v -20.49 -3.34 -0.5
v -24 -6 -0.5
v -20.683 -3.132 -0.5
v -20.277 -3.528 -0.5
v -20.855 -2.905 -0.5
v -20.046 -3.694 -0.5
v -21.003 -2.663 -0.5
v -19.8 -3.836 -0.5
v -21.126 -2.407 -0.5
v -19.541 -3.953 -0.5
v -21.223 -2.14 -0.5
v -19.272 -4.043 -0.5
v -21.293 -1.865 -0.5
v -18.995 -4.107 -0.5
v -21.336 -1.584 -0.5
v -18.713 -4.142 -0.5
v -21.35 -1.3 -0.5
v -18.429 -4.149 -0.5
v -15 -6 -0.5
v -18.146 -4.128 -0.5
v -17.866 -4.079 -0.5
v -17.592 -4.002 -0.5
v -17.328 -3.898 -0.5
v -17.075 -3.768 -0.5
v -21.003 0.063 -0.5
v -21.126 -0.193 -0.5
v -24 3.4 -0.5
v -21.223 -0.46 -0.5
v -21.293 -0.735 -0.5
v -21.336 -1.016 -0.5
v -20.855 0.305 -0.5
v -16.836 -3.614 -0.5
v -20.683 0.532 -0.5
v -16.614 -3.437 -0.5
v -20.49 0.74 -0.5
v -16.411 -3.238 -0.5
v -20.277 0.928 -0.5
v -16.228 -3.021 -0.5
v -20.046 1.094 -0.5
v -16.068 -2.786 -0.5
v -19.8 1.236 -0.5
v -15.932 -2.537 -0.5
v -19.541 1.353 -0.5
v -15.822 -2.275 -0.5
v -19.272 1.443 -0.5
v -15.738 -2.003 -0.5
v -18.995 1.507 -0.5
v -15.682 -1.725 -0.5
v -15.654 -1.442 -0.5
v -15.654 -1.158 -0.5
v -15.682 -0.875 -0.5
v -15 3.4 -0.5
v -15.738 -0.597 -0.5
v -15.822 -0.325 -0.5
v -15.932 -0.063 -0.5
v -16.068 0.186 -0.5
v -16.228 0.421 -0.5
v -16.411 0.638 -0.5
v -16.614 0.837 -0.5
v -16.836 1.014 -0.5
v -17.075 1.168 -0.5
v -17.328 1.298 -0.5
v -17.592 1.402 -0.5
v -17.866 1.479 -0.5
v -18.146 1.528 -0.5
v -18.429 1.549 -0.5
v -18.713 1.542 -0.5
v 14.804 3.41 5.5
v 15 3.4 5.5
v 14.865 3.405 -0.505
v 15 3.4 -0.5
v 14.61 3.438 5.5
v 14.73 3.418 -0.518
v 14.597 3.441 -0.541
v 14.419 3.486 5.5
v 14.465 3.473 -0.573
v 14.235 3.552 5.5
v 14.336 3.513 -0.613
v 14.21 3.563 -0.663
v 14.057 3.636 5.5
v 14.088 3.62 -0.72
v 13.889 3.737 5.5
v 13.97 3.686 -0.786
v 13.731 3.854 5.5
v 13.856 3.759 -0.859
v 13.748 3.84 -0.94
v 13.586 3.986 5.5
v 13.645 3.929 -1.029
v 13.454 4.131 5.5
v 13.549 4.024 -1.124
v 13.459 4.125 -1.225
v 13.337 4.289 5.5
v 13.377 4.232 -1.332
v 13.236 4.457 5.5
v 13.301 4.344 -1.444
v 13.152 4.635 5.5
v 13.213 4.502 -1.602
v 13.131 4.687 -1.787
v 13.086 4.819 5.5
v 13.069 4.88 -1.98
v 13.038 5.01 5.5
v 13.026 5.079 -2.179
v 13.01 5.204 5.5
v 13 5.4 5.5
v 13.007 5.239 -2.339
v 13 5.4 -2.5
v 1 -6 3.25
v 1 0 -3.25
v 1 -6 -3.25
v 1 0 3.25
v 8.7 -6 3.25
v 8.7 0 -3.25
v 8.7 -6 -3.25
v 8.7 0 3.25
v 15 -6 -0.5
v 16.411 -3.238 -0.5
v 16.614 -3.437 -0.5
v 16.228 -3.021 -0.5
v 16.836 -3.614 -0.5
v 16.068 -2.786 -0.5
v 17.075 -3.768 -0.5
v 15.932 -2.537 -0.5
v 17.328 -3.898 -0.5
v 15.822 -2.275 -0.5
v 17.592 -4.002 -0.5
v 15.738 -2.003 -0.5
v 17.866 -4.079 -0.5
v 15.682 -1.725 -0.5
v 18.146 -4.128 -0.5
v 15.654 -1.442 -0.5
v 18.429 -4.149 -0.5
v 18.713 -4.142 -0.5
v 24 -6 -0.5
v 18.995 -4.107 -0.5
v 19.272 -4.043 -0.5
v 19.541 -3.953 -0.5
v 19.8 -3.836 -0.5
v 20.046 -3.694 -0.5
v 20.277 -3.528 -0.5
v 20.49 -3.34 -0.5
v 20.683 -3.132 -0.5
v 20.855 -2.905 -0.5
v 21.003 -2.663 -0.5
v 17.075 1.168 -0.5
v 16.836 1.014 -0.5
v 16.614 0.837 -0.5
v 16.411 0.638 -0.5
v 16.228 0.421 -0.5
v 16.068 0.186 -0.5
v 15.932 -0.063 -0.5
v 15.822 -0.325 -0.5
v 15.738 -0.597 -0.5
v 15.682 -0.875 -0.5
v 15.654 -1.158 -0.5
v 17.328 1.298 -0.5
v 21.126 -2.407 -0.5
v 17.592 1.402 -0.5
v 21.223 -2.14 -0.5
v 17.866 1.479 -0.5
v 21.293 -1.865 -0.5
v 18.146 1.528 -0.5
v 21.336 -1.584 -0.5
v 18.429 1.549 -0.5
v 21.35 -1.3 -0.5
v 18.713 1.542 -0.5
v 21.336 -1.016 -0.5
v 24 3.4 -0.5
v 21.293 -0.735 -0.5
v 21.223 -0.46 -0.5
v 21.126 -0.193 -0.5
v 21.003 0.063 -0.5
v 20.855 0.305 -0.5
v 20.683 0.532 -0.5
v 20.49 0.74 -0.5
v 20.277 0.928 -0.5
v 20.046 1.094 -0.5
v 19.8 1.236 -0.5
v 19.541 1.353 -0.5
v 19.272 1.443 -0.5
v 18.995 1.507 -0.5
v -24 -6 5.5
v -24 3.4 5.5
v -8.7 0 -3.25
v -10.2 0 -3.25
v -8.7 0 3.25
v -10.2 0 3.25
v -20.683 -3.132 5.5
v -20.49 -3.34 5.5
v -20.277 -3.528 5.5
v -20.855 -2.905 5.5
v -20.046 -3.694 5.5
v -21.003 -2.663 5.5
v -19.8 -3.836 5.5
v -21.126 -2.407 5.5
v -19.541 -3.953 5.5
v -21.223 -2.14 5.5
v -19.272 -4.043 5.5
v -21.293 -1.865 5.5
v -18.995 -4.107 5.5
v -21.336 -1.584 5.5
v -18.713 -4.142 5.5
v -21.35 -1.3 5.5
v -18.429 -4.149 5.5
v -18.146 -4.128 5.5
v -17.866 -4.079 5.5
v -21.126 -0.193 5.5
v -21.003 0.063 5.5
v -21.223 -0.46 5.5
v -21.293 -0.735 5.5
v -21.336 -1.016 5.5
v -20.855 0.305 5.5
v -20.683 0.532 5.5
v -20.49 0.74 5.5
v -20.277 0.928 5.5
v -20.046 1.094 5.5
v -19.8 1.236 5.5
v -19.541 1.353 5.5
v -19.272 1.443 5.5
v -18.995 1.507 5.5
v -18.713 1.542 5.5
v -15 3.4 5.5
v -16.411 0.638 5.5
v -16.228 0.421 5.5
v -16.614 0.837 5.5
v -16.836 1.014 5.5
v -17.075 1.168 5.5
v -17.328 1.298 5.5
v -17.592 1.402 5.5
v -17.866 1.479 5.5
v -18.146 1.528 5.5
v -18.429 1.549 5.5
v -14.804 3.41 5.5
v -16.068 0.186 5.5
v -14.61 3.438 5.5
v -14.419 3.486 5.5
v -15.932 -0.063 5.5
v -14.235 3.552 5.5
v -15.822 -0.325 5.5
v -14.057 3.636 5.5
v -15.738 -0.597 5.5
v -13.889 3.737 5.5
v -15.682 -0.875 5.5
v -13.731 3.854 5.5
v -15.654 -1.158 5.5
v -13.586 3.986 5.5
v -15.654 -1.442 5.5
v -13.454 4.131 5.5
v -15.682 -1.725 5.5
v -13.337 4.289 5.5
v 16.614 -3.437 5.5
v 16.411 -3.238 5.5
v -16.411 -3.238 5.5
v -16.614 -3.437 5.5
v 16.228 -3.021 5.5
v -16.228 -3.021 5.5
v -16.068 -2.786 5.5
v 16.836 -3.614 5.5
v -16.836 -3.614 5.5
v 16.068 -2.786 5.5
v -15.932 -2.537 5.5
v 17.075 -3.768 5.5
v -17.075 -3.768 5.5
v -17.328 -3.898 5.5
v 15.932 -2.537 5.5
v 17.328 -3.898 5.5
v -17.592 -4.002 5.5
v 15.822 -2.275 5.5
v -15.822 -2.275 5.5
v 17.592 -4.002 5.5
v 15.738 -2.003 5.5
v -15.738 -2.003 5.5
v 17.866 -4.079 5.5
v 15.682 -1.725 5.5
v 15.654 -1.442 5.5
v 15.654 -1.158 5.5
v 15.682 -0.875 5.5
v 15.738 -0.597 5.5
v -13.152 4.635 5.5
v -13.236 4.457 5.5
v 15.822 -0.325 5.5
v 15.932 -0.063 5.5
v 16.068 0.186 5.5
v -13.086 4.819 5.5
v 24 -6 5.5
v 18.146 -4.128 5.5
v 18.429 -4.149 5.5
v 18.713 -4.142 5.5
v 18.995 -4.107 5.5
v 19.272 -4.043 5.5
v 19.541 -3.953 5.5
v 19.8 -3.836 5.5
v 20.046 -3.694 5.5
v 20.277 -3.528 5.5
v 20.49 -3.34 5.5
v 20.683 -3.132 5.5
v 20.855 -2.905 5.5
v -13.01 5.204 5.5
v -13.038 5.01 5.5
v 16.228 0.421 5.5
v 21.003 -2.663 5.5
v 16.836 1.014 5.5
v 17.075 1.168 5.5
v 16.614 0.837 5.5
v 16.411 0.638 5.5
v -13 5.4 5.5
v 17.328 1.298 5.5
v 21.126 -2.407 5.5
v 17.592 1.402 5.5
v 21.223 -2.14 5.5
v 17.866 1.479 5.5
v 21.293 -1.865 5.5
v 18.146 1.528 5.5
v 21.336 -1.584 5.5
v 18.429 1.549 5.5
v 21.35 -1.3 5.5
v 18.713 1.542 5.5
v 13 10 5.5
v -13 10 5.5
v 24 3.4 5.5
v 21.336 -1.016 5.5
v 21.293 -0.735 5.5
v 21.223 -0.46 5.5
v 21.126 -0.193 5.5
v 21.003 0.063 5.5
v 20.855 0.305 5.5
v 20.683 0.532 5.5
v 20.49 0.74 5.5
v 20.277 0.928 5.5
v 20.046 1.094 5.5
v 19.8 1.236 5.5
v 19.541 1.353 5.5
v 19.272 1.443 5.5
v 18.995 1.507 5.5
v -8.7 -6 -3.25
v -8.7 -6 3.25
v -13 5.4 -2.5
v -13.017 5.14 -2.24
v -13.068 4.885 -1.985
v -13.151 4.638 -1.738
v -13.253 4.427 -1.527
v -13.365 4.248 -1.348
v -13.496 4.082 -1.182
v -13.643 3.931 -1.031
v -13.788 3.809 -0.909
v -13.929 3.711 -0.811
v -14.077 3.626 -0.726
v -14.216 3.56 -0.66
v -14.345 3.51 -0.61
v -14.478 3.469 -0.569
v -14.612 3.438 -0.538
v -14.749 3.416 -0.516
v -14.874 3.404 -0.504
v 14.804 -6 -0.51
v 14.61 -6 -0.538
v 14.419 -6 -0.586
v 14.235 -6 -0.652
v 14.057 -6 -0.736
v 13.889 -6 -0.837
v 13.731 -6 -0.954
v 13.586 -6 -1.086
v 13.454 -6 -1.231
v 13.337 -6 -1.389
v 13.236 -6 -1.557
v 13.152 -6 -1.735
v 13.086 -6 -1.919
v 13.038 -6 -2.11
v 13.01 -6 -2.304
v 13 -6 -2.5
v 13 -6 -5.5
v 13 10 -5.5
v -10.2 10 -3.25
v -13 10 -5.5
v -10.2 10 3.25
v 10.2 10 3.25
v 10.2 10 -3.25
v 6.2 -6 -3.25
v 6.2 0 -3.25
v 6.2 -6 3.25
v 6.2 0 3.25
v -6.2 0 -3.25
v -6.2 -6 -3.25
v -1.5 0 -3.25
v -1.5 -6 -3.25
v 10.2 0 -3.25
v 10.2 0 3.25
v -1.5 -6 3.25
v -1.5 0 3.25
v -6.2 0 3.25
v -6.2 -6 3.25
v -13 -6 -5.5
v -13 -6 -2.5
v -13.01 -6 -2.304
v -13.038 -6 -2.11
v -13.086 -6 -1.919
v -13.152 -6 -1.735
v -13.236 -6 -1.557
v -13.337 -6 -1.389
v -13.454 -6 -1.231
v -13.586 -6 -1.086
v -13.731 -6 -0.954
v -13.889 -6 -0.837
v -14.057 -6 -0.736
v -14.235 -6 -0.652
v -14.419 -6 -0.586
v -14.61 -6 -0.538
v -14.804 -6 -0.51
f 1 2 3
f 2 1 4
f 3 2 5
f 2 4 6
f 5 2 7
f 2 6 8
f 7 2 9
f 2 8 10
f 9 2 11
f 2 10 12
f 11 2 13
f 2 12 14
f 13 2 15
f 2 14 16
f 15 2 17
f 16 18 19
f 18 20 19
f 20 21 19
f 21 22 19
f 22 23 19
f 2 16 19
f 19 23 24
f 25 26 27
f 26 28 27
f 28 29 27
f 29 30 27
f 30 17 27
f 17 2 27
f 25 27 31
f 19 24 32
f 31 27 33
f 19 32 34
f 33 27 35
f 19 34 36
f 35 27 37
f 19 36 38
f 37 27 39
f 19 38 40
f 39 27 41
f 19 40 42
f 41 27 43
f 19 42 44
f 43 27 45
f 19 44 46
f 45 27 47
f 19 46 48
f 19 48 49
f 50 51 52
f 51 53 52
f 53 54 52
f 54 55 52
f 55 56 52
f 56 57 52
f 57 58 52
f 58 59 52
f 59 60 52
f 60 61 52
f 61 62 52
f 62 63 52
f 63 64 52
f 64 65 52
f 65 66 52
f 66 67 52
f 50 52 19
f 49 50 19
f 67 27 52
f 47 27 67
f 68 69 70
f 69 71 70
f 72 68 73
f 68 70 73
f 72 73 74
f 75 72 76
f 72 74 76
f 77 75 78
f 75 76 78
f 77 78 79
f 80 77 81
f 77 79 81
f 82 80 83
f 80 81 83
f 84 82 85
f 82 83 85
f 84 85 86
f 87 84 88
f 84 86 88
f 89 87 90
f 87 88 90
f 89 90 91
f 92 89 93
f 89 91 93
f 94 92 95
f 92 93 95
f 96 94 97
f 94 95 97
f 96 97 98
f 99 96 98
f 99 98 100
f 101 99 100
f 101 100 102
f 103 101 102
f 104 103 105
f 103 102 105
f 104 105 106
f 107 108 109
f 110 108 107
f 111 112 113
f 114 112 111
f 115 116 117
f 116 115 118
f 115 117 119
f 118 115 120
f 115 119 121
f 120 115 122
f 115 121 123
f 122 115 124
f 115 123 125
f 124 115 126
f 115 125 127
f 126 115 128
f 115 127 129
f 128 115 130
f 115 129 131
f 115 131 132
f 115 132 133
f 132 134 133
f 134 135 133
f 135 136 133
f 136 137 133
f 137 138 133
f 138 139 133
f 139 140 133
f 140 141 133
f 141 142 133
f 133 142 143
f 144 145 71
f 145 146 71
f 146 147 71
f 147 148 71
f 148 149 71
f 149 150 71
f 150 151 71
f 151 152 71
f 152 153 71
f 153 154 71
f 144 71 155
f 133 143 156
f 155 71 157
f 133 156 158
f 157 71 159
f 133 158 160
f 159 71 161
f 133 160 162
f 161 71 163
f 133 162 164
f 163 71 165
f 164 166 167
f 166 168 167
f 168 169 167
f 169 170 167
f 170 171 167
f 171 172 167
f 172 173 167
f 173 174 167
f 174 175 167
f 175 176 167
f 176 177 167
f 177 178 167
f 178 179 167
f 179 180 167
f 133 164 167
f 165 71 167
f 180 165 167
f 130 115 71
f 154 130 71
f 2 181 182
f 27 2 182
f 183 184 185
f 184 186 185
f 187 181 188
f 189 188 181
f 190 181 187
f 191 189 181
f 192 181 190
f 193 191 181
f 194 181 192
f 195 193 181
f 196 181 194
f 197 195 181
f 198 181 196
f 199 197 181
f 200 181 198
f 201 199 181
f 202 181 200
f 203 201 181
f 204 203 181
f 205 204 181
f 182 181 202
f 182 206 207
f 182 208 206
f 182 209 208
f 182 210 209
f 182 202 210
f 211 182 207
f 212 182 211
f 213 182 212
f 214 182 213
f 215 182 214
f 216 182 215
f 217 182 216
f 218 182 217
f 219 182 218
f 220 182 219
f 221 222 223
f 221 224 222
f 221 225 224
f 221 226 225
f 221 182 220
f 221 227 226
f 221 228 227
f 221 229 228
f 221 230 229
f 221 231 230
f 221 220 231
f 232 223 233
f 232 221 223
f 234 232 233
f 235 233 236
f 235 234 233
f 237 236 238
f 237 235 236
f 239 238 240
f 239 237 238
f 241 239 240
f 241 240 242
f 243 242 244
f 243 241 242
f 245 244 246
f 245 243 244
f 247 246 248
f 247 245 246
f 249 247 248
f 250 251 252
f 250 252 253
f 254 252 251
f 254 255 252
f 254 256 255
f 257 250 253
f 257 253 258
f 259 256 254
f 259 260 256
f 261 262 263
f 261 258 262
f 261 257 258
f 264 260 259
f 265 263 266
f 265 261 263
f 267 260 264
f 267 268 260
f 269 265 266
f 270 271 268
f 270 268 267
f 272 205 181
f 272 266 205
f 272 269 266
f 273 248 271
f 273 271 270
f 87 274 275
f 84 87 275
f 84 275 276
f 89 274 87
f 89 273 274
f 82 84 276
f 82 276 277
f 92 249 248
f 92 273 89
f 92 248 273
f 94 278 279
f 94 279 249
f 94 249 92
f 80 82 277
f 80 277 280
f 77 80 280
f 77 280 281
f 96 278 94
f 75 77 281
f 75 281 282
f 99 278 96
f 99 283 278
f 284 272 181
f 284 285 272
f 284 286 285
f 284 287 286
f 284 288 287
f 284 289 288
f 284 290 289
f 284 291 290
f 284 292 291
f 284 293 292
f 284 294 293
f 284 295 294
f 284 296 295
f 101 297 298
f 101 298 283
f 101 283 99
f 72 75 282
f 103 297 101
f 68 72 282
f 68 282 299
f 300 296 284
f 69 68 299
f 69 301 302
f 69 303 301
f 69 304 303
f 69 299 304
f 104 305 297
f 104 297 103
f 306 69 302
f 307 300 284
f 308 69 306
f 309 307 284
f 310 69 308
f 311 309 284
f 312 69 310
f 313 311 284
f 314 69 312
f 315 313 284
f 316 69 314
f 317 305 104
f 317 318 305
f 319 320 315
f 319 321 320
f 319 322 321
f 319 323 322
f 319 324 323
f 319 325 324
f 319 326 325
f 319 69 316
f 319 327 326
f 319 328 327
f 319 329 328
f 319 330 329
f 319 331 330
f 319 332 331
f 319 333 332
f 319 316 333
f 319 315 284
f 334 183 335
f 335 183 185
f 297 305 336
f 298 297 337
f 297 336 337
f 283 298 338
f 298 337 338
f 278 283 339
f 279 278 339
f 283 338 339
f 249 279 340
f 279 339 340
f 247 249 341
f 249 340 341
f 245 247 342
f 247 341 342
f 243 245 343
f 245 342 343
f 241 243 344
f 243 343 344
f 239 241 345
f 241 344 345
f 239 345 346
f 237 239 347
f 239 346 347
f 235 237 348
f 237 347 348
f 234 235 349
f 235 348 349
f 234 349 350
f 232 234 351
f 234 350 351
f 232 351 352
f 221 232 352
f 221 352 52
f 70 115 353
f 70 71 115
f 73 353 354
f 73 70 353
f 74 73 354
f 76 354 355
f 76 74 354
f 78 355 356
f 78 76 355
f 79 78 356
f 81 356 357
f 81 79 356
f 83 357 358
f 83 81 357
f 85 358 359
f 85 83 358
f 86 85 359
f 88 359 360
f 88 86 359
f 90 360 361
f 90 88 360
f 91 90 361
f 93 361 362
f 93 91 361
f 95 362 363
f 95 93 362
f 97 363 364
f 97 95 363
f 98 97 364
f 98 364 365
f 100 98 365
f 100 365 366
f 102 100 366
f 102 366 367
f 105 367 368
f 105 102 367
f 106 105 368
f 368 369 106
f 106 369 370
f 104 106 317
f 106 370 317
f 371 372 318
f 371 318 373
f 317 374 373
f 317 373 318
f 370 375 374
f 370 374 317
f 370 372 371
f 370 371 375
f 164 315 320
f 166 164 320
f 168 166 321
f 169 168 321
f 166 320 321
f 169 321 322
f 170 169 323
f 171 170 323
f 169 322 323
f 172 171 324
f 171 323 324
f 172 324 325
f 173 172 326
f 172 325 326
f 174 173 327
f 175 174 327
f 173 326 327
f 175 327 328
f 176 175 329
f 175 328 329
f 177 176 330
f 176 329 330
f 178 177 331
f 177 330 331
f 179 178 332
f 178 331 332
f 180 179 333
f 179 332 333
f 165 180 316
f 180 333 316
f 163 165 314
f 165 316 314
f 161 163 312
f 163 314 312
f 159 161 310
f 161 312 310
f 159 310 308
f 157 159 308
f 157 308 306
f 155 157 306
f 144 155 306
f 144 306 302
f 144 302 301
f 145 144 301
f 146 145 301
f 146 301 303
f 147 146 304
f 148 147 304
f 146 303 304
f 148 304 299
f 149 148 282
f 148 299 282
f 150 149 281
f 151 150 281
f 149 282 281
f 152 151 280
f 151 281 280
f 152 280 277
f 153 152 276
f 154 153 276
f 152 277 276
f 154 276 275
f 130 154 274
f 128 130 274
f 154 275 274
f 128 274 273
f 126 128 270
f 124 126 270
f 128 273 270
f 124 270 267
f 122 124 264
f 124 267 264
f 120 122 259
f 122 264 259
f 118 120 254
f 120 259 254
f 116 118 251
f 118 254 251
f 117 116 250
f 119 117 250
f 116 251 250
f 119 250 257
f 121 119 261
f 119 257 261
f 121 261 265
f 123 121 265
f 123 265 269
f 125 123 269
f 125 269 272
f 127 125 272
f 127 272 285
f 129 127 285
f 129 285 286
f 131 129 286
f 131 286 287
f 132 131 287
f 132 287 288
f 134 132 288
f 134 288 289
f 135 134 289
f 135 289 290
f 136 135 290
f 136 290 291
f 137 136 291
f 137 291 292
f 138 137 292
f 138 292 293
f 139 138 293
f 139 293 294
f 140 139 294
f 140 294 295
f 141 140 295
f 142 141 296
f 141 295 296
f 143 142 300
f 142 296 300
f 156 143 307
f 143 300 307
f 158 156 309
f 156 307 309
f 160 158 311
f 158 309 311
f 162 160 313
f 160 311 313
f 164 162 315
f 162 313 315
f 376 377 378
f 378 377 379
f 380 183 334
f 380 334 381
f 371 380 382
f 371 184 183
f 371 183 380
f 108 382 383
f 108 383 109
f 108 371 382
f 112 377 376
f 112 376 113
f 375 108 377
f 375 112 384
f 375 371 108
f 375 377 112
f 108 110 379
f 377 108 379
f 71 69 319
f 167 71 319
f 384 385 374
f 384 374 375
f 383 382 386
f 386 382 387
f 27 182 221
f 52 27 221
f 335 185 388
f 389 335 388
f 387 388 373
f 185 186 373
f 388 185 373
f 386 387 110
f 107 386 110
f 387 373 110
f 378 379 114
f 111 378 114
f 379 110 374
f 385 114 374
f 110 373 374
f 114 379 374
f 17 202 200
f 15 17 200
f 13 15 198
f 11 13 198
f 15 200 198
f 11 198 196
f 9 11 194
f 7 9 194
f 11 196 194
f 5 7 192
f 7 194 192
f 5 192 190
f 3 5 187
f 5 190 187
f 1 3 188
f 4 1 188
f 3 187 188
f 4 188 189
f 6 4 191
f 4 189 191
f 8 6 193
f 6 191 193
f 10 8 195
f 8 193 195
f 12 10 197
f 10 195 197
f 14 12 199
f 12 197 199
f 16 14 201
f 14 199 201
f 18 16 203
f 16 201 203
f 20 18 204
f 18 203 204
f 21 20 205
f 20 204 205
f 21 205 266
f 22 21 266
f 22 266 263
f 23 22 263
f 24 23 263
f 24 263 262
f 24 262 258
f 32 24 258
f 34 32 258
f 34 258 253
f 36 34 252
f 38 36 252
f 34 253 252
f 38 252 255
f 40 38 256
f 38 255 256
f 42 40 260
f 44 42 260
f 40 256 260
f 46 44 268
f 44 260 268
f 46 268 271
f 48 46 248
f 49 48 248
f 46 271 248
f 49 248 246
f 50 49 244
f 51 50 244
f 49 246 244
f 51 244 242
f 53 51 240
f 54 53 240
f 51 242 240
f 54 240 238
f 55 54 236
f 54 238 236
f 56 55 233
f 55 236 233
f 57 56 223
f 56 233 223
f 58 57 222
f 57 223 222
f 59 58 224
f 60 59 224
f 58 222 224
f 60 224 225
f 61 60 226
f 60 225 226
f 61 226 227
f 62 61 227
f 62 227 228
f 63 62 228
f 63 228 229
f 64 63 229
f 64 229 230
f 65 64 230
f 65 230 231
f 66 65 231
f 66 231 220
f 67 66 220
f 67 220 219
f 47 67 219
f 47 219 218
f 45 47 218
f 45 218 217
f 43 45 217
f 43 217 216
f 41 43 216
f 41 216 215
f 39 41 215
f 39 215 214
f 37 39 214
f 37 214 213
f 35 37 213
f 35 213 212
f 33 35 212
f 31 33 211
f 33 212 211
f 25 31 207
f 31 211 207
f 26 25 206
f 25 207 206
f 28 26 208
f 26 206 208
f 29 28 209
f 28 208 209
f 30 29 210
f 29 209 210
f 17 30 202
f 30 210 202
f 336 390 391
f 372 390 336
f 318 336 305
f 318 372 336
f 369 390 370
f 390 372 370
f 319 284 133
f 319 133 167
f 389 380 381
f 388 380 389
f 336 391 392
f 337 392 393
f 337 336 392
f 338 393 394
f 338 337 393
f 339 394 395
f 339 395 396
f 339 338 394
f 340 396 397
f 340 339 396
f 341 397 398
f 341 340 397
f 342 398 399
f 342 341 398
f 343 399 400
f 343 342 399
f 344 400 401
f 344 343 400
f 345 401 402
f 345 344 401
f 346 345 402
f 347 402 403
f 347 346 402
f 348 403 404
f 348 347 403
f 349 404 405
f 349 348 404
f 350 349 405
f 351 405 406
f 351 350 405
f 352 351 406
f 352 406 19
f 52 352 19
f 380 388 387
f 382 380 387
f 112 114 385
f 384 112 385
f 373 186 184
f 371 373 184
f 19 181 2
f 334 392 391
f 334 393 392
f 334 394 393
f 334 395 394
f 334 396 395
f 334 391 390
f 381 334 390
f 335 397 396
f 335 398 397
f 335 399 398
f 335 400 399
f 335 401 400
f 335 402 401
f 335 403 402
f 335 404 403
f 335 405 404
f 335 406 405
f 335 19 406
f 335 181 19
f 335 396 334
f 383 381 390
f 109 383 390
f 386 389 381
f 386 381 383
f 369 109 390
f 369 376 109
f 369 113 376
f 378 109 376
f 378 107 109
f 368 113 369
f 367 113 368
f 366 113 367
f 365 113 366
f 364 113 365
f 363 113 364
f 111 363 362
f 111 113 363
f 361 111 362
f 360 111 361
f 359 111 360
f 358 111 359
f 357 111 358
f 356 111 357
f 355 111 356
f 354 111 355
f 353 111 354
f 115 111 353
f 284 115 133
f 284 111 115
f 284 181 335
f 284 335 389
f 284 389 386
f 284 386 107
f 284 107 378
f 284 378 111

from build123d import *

# Parameters (mm, degrees)
SKETCH2_W           = 26
SKETCH2_H           = 11
SKETCH2_W_2         = 20.4
SKETCH2_H_2         = 6.5
BOSS_EXTRUDE1_DEPTH = 10
SKETCH3_W           = 26
SKETCH3_H           = 11
SKETCH3_W_2         = 2.5
SKETCH3_H_2         = 6.5
BOSS_EXTRUDE2_DEPTH = 6
SKETCH4_W           = 11
SKETCH4_H           = 9.4
SKETCH4_R           = 2.85
BOSS_EXTRUDE3_DEPTH = 6
FILLET1_R           = 2


with BuildPart() as part:
    # Sketch2 → Boss-Extrude1 (new body)
    with BuildSketch(Plane(origin=(0, 0, 0), x_dir=(1, 0, 0), z_dir=(0, 1, 0))):
        Rectangle(SKETCH2_W, SKETCH2_H)
        Rectangle(SKETCH2_W_2, SKETCH2_H_2, mode=Mode.SUBTRACT)
    extrude(amount=BOSS_EXTRUDE1_DEPTH)

    # Sketch3 → Boss-Extrude2 (add)
    with BuildSketch(Plane.XZ):
        Rectangle(SKETCH3_W, SKETCH3_H)
        with Locations((-7.45, 0)):
            Rectangle(SKETCH3_W_2, SKETCH3_H_2, mode=Mode.SUBTRACT)
        with Locations((-0.25, 0)):
            Rectangle(SKETCH3_W_2, SKETCH3_H_2, mode=Mode.SUBTRACT)
        with Locations((7.45, 0)):
            Rectangle(SKETCH3_W_2, SKETCH3_H_2, mode=Mode.SUBTRACT)
    extrude(amount=BOSS_EXTRUDE2_DEPTH)

    # Sketch4 → Boss-Extrude3 (add)
    # profile 1 of 2: a face of its own
    with BuildSketch(Plane.XY.offset(5.5)):
        with Locations((18.5, -1.3)):
            Rectangle(SKETCH4_W, SKETCH4_H)
        with Locations((18.5, -1.3)):
            Circle(SKETCH4_R, mode=Mode.SUBTRACT)
    # profile 2 of 2: a face of its own
    with BuildSketch(Plane.XY.offset(5.5)):
        with Locations((-18.5, -1.3)):
            Rectangle(SKETCH4_W, SKETCH4_H)
        with Locations(Location((-18.5, -1.3, 0), (0, 0, 180))):
            Circle(SKETCH4_R, mode=Mode.SUBTRACT)
    extrude(amount=-BOSS_EXTRUDE3_DEPTH)

    # Fillet1
    fillet1_edges = [part.edges().sort_by_distance(p)[0] for p in [
        (13, -1.3, -0.5),
        (13, 3.4, 2.5),
        (-13, -1.3, -0.5),
        (-13, 3.4, 2.5),
    ]]
    fillet(fillet1_edges, radius=FILLET1_R)


solid = part.part
